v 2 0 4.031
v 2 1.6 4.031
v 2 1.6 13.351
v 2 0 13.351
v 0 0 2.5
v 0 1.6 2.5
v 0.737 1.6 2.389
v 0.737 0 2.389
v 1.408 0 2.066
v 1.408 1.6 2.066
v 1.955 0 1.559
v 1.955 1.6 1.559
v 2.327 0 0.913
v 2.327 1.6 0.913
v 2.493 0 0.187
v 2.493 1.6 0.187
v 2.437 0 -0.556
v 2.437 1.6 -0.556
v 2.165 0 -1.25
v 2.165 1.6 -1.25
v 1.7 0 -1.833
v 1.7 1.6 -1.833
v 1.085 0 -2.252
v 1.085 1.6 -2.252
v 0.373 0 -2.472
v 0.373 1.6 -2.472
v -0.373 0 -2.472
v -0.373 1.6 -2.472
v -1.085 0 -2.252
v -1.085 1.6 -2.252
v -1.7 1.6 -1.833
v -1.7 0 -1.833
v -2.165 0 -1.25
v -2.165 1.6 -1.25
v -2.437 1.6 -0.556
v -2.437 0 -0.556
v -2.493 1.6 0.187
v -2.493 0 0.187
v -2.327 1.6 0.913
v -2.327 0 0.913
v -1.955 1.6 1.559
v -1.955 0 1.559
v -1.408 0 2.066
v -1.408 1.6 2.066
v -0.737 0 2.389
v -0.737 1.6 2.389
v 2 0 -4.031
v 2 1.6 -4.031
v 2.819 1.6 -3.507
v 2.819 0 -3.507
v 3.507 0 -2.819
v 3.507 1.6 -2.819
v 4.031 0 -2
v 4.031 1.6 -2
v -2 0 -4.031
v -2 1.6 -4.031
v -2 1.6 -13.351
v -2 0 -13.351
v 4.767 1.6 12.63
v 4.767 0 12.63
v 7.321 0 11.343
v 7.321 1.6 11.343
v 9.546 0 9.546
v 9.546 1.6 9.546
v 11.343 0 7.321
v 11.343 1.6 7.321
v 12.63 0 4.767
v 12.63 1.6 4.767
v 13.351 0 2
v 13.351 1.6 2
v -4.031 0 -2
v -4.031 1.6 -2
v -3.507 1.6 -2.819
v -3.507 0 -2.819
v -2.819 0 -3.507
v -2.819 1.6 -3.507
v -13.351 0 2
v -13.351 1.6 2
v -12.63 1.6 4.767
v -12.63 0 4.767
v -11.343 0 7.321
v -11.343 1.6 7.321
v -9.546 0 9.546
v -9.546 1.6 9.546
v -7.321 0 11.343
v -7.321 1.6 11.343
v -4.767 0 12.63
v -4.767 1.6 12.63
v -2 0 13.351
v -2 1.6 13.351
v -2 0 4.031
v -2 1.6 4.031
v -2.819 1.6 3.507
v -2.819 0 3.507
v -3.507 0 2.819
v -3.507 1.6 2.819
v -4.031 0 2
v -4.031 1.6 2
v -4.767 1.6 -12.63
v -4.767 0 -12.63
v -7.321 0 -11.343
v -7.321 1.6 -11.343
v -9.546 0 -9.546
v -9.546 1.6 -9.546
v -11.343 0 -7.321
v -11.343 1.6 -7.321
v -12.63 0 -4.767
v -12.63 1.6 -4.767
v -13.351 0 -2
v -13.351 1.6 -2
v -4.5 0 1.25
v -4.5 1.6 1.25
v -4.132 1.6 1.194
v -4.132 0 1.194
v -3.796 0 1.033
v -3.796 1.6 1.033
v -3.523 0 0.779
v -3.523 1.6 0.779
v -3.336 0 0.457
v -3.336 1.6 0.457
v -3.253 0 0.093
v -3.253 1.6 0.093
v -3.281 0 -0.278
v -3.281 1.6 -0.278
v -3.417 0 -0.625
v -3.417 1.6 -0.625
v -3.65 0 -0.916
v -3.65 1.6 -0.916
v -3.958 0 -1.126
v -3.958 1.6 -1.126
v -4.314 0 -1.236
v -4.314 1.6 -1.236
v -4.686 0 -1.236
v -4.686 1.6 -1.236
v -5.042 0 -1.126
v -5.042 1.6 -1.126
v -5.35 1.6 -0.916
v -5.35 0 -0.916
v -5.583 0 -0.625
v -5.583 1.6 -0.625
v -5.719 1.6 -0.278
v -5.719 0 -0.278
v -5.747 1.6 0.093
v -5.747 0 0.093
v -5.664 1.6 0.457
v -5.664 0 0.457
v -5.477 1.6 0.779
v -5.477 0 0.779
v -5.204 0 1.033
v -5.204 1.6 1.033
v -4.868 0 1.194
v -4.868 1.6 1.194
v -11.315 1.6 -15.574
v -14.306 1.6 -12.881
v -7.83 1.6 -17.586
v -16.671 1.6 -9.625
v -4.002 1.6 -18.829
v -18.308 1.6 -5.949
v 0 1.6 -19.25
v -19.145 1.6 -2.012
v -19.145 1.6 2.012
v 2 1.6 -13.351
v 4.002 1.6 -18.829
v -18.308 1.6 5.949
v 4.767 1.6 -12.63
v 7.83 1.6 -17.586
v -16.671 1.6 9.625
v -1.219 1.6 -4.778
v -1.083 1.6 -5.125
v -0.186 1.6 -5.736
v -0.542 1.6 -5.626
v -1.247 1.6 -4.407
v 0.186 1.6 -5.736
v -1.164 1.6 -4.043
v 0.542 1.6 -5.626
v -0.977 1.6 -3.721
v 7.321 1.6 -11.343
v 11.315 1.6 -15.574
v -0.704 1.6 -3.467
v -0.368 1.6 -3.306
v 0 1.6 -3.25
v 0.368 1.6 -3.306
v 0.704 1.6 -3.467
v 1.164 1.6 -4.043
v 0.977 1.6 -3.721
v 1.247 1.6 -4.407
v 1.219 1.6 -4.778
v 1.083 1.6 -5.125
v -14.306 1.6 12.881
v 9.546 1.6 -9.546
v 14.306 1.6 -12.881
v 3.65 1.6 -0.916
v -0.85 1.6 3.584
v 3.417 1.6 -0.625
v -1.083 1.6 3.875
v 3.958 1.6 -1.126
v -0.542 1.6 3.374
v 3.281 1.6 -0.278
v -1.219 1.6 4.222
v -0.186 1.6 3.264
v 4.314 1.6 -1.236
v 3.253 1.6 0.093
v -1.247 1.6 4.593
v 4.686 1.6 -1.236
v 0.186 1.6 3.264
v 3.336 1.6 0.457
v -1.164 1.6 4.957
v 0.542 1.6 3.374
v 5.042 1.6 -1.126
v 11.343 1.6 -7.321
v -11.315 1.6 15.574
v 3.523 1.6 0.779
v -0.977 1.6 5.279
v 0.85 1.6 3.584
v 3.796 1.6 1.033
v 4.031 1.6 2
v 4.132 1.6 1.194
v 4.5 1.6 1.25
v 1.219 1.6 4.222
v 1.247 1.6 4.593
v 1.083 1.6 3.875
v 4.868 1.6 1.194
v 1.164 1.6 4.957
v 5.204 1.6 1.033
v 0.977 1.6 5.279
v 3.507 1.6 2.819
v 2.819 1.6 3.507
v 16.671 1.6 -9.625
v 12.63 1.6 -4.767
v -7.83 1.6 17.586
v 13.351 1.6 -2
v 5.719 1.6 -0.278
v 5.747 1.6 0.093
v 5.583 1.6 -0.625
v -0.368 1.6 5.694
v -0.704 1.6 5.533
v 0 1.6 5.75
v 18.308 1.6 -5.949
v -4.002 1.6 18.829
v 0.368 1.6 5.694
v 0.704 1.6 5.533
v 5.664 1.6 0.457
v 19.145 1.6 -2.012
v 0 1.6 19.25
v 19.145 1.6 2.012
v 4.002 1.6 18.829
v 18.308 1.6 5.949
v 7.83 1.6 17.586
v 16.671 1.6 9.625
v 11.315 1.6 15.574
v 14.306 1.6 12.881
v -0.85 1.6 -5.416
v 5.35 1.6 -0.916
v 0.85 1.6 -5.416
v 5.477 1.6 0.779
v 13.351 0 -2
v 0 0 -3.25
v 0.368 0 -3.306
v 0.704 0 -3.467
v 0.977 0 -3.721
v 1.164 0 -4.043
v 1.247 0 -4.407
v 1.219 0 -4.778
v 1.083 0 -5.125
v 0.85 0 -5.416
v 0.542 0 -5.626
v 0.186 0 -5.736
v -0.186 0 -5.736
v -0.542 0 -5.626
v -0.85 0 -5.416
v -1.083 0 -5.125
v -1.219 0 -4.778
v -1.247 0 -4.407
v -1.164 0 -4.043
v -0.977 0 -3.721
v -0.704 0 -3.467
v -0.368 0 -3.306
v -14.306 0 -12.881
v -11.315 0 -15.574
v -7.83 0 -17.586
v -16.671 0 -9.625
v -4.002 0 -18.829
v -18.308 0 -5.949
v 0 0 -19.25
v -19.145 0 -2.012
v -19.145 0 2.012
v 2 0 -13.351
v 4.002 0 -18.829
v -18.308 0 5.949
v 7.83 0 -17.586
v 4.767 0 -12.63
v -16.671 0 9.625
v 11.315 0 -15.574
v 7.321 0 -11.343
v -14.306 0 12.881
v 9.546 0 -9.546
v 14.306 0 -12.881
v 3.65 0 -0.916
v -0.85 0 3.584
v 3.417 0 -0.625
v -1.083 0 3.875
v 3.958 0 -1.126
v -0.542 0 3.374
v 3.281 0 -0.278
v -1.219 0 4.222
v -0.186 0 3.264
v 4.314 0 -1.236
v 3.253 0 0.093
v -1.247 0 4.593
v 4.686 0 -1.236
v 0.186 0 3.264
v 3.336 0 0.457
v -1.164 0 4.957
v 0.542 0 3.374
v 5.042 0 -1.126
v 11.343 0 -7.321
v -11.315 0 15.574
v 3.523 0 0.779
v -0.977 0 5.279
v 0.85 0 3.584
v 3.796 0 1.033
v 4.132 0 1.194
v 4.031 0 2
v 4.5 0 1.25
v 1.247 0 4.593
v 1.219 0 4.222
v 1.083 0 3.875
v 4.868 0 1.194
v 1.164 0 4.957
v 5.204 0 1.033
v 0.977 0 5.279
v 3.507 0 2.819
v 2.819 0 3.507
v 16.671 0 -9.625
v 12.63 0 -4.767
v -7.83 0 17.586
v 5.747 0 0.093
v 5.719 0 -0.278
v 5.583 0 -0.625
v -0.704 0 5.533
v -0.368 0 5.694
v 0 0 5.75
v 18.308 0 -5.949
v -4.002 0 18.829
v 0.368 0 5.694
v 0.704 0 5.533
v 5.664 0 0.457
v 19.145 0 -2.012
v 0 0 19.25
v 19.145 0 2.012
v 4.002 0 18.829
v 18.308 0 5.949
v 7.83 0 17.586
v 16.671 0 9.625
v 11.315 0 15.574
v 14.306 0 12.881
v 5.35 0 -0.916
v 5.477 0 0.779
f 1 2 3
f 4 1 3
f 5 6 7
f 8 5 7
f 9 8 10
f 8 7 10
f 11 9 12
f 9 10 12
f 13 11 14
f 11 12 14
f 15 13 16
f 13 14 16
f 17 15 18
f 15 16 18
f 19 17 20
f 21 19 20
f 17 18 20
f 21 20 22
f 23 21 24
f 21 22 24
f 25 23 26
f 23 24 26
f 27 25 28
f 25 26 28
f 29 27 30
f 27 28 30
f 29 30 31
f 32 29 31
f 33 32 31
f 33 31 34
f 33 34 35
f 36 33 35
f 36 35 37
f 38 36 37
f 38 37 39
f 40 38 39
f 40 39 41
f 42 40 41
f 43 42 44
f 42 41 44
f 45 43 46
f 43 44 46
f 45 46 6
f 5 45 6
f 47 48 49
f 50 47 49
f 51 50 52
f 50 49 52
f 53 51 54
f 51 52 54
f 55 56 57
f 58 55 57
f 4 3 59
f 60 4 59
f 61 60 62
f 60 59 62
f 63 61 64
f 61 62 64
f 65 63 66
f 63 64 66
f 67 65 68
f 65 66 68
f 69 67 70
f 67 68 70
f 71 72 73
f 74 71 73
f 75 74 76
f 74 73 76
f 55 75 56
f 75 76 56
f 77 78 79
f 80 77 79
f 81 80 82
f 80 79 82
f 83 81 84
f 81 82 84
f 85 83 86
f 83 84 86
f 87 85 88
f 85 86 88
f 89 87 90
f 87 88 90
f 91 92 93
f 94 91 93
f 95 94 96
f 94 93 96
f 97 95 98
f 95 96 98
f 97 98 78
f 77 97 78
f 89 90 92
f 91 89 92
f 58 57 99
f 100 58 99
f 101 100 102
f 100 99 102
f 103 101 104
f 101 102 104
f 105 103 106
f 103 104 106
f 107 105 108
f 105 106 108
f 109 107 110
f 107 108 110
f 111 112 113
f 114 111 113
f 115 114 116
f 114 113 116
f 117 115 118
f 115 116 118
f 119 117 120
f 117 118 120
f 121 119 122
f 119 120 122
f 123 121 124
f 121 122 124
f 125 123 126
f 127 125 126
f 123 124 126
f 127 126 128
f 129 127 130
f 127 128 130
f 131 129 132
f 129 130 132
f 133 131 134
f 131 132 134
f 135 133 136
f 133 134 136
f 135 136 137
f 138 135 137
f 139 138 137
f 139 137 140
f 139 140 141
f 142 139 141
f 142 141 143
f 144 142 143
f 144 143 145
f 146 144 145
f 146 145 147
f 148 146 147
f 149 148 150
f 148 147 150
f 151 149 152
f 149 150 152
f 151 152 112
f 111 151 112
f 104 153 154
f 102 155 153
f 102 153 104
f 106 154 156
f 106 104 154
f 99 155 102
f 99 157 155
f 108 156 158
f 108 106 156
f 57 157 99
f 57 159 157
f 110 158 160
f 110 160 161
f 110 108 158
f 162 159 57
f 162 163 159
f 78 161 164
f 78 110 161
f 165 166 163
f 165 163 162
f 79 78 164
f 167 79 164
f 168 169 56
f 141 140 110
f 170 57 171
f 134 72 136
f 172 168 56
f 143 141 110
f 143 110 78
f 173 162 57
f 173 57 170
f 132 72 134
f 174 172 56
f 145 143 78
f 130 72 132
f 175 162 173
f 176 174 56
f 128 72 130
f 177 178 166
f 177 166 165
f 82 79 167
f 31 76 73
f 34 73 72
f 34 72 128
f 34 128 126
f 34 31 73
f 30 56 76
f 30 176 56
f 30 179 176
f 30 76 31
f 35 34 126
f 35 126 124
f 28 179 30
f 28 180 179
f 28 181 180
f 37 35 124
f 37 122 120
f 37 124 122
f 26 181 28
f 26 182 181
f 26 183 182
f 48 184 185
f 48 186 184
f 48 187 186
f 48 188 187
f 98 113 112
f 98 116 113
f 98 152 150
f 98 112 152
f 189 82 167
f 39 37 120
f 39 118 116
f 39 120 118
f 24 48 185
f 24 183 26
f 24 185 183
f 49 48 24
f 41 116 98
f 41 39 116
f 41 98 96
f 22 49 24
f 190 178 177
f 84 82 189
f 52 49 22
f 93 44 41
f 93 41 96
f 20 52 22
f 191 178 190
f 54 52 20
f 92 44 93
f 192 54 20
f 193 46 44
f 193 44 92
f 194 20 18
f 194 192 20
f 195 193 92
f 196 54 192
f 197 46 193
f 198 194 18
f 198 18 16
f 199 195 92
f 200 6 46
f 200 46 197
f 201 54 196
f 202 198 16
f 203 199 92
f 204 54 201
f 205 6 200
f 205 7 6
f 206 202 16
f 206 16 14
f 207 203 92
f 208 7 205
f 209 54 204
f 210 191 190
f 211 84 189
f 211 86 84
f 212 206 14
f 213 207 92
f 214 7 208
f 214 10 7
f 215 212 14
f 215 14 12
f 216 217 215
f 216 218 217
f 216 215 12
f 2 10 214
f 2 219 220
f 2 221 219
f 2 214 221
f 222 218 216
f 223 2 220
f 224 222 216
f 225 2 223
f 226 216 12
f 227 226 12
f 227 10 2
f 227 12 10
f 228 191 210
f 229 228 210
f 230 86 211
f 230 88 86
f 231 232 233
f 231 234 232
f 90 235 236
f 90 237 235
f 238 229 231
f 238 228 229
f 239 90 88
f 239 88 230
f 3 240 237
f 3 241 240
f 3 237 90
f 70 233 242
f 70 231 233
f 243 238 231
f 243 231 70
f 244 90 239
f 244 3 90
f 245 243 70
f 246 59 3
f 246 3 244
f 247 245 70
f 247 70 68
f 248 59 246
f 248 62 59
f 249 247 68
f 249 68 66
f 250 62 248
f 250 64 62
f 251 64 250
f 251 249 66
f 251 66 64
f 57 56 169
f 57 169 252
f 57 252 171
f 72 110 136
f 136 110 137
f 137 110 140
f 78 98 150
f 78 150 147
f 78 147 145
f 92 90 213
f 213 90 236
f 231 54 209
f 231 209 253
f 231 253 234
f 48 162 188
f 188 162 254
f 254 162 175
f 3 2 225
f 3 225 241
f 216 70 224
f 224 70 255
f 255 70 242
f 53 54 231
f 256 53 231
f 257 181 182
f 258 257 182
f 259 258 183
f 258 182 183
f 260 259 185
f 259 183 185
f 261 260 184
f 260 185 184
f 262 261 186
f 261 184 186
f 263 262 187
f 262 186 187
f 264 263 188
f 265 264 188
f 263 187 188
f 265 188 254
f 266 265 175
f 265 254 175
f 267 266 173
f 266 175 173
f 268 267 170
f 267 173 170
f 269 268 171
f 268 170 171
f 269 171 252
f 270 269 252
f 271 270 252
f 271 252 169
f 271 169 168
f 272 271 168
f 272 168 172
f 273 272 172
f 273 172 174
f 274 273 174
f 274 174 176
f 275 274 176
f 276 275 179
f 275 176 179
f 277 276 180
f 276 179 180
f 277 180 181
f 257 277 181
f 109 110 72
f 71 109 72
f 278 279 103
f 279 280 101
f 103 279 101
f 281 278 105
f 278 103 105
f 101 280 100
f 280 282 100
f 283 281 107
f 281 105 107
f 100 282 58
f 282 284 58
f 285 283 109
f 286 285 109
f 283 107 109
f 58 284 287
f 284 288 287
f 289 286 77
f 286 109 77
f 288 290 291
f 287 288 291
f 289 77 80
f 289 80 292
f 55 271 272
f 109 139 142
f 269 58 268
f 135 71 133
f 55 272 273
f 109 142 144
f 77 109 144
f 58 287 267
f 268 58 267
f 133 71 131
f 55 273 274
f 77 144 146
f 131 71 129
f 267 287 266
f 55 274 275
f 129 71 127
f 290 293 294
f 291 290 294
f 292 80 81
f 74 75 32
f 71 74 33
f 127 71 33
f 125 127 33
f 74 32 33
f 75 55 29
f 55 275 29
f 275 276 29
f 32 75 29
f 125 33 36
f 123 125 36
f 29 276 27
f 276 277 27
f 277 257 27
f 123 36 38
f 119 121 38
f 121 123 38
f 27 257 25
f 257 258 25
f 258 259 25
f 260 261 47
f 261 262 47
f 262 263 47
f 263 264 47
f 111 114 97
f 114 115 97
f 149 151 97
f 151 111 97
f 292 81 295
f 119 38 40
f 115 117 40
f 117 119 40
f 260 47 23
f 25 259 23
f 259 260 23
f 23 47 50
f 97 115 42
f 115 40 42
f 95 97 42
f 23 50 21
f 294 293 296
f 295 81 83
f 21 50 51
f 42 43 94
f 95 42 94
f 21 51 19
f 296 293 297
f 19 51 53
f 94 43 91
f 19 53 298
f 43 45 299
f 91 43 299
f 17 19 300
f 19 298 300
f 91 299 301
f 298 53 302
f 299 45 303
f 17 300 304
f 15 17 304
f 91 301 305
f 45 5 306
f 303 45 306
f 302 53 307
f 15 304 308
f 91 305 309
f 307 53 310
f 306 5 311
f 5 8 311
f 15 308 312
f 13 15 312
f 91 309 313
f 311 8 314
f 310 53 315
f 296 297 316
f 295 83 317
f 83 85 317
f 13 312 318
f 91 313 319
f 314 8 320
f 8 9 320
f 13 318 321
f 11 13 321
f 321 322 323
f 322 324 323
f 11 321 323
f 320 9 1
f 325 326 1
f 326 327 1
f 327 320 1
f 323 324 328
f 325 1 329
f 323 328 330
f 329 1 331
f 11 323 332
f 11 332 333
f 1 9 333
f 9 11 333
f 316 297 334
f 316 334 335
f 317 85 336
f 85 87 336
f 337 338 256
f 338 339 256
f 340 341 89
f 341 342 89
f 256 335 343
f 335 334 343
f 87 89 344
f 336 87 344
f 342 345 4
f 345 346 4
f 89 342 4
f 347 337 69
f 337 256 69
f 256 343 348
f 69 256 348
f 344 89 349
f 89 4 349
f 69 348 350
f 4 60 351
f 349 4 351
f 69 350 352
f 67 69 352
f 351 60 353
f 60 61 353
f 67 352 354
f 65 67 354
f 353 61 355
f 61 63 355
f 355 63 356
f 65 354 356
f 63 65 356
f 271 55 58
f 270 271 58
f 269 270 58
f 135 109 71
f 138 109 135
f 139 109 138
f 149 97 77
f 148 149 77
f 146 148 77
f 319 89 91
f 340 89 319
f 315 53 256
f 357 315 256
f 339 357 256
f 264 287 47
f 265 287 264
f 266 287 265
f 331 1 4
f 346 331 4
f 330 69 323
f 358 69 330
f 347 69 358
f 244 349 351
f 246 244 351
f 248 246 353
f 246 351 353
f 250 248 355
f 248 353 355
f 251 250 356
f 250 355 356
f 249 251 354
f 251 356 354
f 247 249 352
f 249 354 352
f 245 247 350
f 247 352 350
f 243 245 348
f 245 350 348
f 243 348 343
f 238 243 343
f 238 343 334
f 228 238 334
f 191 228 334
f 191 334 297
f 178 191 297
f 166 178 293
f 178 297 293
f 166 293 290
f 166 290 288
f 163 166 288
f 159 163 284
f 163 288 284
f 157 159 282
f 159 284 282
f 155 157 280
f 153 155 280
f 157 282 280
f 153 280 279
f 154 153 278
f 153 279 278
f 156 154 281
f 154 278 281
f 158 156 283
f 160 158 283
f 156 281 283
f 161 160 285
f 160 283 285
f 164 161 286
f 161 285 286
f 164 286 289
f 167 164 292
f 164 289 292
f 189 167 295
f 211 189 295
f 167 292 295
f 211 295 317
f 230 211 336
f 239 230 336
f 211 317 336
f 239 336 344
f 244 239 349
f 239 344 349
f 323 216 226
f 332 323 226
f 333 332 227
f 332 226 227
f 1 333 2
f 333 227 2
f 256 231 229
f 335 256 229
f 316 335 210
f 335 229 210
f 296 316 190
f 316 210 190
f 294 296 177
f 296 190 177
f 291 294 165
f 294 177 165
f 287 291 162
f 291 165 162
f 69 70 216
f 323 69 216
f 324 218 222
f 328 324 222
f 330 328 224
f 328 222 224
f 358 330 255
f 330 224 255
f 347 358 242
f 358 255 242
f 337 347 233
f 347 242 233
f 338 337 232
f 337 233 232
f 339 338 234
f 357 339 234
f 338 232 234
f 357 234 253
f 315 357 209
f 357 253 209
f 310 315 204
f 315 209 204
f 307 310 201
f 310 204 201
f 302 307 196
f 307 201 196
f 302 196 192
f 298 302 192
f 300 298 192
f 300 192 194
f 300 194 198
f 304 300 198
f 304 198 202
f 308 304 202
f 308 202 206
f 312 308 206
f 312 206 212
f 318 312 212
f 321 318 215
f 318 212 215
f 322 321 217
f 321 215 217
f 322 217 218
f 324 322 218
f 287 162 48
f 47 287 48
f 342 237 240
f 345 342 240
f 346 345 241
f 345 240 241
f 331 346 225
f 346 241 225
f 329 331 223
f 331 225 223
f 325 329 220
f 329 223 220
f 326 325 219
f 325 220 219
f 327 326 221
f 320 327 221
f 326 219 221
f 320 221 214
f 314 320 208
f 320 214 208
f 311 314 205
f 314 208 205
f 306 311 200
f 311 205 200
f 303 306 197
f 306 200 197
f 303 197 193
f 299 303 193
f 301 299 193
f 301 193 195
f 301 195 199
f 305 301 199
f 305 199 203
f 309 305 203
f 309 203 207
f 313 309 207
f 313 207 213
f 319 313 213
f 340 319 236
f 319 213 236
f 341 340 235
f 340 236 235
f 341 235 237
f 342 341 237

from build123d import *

# Parameters (mm, degrees)
CROQUIS1_R              = 19.25
SALIENTE_EXTRUIR1_DEPTH = 1.6
CROQUIS2_R              = 2.5
CROQUIS2_R_2            = 1.25
CORTAR_EXTRUIR1_DEPTH   = 1.6
CORTAR_EXTRUIR2_DEPTH   = 1.6


with BuildPart() as part:
    # Croquis1 → Saliente-Extruir1 (new body)
    with BuildSketch(Plane(origin=(0, 0, 0), x_dir=(1, 0, 0), z_dir=(0, 1, 0))):
        with Locations(Location((0, 0, 0), (0, 0, 270))):
            Circle(CROQUIS1_R)
    extrude(amount=SALIENTE_EXTRUIR1_DEPTH)

    # Croquis2 → Cortar-Extruir1 (cut)
    with BuildSketch(Plane(origin=(0, 1.6, 0), x_dir=(1, 0, 0), z_dir=(0, 1, 0))):
        with Locations(Location((0, 0, 0), (0, 0, 270))):
            Circle(CROQUIS2_R)
        with Locations(Location((0, 4.5, 0), (0, 0, 270))):
            Circle(CROQUIS2_R_2)
        with Locations(Location((4.5, 0, 0), (0, 0, 270))):
            Circle(CROQUIS2_R_2)
        with Locations(Location((0, -4.5, 0), (0, 0, 270))):
            Circle(CROQUIS2_R_2)
        with Locations(Location((-4.5, 0, 0), (0, 0, 270))):
            Circle(CROQUIS2_R_2)
    extrude(amount=-CORTAR_EXTRUIR1_DEPTH, mode=Mode.SUBTRACT)

    # Croquis3 → Cortar-Extruir2 (cut)
    with BuildSketch(Plane(origin=(0, 1.6, 0), x_dir=(1, 0, 0), z_dir=(0, 1, 0))):
        with BuildLine():
            Line((-2, 4.031128874), (-2, 13.351029923))
            ThreePointArc((-2, 13.351029923), (-9.545941546, 9.545941546), (-13.351029923, 2))
            Line((-13.351029923, 2), (-4.031128874, 2))
            ThreePointArc((-4.031128874, 2), (-3.181980515, 3.181980515), (-2, 4.031128874))
        make_face()
        with BuildLine():
            ThreePointArc((13.351029923, 2), (9.545941546, 9.545941546), (2, 13.351029923))
            Line((2, 13.351029923), (2, 4.031128874))
            ThreePointArc((2, 4.031128874), (3.181980515, 3.181980515), (4.031128874, 2))
            Line((4.031128874, 2), (13.351029923, 2))
        make_face()
        with BuildLine():
            ThreePointArc((2, -13.351029923), (9.545941546, -9.545941546), (13.351029923, -2))
            Line((13.351029923, -2), (4.031128874, -2))
            ThreePointArc((4.031128874, -2), (3.181980515, -3.181980515), (2, -4.031128874))
            Line((2, -4.031128874), (2, -13.351029923))
        make_face()
        with BuildLine():
            Line((-4.031128874, -2), (-13.351029923, -2))
            ThreePointArc((-13.351029923, -2), (-9.545941546, -9.545941546), (-2, -13.351029923))
            Line((-2, -13.351029923), (-2, -4.031128874))
            ThreePointArc((-2, -4.031128874), (-3.181980515, -3.181980515), (-4.031128874, -2))
        make_face()
    extrude(amount=-CORTAR_EXTRUIR2_DEPTH, mode=Mode.SUBTRACT)


solid = part.part
